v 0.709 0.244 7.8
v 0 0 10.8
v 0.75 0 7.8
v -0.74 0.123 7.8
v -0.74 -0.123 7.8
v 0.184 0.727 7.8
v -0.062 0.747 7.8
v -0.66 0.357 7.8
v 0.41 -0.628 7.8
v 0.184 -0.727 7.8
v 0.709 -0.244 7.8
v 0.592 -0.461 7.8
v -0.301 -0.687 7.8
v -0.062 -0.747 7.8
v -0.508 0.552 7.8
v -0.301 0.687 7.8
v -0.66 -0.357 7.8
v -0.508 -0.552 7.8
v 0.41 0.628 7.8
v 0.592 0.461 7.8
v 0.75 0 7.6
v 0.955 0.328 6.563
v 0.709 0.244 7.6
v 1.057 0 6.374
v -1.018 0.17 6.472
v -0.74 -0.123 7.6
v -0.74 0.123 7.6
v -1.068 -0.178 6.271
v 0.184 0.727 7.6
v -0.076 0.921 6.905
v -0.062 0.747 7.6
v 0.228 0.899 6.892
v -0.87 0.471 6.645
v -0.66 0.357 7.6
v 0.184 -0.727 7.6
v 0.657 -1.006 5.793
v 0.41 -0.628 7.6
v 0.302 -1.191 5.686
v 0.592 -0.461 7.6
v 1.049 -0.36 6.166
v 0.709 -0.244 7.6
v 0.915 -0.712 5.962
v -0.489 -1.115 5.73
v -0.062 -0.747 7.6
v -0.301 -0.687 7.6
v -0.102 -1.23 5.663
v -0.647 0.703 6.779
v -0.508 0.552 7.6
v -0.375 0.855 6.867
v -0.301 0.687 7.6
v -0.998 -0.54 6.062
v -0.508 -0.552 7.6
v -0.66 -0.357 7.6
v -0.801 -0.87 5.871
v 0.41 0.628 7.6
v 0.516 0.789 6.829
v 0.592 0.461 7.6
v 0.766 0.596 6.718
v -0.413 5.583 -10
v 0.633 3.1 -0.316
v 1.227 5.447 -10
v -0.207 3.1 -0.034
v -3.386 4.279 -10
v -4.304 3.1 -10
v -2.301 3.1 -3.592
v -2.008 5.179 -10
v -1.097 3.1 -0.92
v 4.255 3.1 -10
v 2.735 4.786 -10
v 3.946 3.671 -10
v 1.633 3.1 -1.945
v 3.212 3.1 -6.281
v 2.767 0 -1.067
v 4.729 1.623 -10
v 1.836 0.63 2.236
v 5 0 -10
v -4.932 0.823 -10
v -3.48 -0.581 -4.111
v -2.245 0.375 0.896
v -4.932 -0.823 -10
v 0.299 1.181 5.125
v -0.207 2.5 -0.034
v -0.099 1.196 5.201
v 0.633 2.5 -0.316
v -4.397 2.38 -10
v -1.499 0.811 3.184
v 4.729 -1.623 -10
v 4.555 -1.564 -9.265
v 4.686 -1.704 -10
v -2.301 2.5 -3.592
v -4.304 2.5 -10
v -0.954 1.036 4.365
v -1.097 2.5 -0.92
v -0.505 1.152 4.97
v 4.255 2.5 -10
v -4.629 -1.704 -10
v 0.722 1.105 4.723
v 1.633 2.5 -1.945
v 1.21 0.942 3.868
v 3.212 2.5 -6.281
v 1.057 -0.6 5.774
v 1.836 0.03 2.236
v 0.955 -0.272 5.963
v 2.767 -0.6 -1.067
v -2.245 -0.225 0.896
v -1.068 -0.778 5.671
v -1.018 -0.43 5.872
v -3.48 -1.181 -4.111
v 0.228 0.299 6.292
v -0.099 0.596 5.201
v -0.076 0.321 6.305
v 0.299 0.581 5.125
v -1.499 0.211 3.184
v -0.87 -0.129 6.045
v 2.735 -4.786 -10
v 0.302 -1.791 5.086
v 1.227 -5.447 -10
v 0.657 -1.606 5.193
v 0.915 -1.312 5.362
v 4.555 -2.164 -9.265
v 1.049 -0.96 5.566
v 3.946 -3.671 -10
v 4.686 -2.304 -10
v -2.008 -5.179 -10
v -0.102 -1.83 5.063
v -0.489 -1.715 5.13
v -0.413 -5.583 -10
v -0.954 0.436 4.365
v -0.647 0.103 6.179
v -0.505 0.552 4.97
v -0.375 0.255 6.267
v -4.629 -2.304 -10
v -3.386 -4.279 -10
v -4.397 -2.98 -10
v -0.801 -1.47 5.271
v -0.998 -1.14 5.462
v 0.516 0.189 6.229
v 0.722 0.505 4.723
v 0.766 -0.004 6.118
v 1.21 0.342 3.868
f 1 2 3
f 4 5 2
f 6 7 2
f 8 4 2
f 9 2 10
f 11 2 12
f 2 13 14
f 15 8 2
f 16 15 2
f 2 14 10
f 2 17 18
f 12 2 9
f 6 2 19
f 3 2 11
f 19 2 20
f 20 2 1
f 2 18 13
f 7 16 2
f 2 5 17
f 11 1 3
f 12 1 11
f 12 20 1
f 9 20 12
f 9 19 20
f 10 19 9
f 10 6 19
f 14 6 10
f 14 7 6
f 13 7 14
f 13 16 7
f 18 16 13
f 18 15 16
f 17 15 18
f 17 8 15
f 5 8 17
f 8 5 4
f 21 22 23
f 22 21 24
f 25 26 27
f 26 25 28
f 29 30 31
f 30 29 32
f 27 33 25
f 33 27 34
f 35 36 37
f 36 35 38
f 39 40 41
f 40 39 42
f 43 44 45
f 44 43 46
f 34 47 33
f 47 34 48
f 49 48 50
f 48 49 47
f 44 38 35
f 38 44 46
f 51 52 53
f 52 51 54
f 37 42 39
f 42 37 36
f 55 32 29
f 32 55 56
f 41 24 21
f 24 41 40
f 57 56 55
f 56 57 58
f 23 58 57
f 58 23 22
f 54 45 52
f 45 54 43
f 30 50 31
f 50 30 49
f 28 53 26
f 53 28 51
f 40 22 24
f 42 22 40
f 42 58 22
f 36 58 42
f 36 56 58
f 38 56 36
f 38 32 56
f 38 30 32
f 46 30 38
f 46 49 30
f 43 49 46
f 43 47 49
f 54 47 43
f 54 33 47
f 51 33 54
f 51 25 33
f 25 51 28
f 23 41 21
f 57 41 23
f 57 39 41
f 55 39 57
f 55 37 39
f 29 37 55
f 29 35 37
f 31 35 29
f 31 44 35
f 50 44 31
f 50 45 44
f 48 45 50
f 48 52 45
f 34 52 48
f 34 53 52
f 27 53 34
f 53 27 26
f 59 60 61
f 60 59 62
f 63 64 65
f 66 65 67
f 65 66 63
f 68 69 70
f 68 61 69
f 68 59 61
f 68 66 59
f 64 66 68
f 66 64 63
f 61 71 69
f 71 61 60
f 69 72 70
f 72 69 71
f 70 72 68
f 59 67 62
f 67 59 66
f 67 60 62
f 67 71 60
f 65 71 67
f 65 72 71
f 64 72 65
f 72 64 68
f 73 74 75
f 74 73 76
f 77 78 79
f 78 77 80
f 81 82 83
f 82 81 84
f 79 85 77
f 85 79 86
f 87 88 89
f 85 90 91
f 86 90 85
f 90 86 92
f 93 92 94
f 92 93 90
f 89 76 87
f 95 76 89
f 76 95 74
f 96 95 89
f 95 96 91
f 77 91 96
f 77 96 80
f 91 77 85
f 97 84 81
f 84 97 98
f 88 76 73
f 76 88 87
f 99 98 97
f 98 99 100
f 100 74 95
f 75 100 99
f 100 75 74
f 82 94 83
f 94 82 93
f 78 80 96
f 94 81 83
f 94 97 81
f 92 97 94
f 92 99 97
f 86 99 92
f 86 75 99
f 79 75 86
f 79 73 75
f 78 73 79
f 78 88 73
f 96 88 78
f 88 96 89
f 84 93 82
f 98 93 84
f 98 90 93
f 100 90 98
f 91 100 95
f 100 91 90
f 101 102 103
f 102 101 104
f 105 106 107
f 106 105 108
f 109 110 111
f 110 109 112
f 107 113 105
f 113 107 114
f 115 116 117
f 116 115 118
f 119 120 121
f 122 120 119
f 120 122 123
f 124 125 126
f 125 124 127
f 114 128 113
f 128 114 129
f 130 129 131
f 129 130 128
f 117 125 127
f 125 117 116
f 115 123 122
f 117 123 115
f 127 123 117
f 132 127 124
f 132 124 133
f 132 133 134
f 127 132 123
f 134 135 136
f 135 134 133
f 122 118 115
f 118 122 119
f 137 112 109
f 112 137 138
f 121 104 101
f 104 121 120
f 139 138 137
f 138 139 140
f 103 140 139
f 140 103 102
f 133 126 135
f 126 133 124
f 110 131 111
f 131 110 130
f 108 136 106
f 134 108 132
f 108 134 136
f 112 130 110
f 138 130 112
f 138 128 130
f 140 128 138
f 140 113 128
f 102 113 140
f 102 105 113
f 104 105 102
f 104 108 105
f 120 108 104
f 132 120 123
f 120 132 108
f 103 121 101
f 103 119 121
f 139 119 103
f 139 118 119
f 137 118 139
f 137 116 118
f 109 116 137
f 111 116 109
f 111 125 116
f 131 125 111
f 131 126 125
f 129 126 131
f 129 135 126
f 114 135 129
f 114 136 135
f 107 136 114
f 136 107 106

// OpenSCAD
altura1 = 20;

module cono(){cylinder(h=altura1, r1=altura1/4, r2=0, center=true, $fn = 19);}

module bloque(){
    rotate(a = 30, v = [1,0,0]) 
    translate([0,1,10])
    cylinder( h=altura1/2, r1=altura1/4, r2=altura1/4, center=true, $fn = 4);
    }  


module parte_elipse() 
{
    difference()
    {
        intersection()
        {
            cono(); 
           bloque();
        } 
        translate([0,0,11.5])
    cube([9,9,9],center=true);
    }
}

module parte_circulo() {
intersection(){
    cono(); 
    translate([0,0,11.5])
    cube([9,9,9],center=true);
    } 

}


module parte_parabola() {
intersection(){
    cono(); 
    translate([0,7,-3.4])
    cube([9,9,14],center=true);
    } 

}

module parte_hiperbola() {
    difference()
    {
intersection(){
    cono();
    rotate(a = -10.8, v = [1,0,0])
    translate([1,-3.3+8,-3.4])
    cube([12,9,20.9],center=true);
    } 
translate([0,7,-3.4]) cube([9,9,14],center=true);
}}

module parte_abstracta() {
   
difference(){
    cono();
    rotate(a = -10.8, v = [1,0,0])
    translate([1,-3.3+8,-3.4])
    cube([12,9,20.9],center=true);
     bloque();
    } 

}


color("yellow")
translate([0,0,0.8]) parte_circulo();

color("brown")
translate([0,0,0.6]) 
parte_elipse();

color("green")
translate([0,0.6,0])
parte_parabola();

parte_hiperbola();

translate([0,-0.6,0])
parte_abstracta();
